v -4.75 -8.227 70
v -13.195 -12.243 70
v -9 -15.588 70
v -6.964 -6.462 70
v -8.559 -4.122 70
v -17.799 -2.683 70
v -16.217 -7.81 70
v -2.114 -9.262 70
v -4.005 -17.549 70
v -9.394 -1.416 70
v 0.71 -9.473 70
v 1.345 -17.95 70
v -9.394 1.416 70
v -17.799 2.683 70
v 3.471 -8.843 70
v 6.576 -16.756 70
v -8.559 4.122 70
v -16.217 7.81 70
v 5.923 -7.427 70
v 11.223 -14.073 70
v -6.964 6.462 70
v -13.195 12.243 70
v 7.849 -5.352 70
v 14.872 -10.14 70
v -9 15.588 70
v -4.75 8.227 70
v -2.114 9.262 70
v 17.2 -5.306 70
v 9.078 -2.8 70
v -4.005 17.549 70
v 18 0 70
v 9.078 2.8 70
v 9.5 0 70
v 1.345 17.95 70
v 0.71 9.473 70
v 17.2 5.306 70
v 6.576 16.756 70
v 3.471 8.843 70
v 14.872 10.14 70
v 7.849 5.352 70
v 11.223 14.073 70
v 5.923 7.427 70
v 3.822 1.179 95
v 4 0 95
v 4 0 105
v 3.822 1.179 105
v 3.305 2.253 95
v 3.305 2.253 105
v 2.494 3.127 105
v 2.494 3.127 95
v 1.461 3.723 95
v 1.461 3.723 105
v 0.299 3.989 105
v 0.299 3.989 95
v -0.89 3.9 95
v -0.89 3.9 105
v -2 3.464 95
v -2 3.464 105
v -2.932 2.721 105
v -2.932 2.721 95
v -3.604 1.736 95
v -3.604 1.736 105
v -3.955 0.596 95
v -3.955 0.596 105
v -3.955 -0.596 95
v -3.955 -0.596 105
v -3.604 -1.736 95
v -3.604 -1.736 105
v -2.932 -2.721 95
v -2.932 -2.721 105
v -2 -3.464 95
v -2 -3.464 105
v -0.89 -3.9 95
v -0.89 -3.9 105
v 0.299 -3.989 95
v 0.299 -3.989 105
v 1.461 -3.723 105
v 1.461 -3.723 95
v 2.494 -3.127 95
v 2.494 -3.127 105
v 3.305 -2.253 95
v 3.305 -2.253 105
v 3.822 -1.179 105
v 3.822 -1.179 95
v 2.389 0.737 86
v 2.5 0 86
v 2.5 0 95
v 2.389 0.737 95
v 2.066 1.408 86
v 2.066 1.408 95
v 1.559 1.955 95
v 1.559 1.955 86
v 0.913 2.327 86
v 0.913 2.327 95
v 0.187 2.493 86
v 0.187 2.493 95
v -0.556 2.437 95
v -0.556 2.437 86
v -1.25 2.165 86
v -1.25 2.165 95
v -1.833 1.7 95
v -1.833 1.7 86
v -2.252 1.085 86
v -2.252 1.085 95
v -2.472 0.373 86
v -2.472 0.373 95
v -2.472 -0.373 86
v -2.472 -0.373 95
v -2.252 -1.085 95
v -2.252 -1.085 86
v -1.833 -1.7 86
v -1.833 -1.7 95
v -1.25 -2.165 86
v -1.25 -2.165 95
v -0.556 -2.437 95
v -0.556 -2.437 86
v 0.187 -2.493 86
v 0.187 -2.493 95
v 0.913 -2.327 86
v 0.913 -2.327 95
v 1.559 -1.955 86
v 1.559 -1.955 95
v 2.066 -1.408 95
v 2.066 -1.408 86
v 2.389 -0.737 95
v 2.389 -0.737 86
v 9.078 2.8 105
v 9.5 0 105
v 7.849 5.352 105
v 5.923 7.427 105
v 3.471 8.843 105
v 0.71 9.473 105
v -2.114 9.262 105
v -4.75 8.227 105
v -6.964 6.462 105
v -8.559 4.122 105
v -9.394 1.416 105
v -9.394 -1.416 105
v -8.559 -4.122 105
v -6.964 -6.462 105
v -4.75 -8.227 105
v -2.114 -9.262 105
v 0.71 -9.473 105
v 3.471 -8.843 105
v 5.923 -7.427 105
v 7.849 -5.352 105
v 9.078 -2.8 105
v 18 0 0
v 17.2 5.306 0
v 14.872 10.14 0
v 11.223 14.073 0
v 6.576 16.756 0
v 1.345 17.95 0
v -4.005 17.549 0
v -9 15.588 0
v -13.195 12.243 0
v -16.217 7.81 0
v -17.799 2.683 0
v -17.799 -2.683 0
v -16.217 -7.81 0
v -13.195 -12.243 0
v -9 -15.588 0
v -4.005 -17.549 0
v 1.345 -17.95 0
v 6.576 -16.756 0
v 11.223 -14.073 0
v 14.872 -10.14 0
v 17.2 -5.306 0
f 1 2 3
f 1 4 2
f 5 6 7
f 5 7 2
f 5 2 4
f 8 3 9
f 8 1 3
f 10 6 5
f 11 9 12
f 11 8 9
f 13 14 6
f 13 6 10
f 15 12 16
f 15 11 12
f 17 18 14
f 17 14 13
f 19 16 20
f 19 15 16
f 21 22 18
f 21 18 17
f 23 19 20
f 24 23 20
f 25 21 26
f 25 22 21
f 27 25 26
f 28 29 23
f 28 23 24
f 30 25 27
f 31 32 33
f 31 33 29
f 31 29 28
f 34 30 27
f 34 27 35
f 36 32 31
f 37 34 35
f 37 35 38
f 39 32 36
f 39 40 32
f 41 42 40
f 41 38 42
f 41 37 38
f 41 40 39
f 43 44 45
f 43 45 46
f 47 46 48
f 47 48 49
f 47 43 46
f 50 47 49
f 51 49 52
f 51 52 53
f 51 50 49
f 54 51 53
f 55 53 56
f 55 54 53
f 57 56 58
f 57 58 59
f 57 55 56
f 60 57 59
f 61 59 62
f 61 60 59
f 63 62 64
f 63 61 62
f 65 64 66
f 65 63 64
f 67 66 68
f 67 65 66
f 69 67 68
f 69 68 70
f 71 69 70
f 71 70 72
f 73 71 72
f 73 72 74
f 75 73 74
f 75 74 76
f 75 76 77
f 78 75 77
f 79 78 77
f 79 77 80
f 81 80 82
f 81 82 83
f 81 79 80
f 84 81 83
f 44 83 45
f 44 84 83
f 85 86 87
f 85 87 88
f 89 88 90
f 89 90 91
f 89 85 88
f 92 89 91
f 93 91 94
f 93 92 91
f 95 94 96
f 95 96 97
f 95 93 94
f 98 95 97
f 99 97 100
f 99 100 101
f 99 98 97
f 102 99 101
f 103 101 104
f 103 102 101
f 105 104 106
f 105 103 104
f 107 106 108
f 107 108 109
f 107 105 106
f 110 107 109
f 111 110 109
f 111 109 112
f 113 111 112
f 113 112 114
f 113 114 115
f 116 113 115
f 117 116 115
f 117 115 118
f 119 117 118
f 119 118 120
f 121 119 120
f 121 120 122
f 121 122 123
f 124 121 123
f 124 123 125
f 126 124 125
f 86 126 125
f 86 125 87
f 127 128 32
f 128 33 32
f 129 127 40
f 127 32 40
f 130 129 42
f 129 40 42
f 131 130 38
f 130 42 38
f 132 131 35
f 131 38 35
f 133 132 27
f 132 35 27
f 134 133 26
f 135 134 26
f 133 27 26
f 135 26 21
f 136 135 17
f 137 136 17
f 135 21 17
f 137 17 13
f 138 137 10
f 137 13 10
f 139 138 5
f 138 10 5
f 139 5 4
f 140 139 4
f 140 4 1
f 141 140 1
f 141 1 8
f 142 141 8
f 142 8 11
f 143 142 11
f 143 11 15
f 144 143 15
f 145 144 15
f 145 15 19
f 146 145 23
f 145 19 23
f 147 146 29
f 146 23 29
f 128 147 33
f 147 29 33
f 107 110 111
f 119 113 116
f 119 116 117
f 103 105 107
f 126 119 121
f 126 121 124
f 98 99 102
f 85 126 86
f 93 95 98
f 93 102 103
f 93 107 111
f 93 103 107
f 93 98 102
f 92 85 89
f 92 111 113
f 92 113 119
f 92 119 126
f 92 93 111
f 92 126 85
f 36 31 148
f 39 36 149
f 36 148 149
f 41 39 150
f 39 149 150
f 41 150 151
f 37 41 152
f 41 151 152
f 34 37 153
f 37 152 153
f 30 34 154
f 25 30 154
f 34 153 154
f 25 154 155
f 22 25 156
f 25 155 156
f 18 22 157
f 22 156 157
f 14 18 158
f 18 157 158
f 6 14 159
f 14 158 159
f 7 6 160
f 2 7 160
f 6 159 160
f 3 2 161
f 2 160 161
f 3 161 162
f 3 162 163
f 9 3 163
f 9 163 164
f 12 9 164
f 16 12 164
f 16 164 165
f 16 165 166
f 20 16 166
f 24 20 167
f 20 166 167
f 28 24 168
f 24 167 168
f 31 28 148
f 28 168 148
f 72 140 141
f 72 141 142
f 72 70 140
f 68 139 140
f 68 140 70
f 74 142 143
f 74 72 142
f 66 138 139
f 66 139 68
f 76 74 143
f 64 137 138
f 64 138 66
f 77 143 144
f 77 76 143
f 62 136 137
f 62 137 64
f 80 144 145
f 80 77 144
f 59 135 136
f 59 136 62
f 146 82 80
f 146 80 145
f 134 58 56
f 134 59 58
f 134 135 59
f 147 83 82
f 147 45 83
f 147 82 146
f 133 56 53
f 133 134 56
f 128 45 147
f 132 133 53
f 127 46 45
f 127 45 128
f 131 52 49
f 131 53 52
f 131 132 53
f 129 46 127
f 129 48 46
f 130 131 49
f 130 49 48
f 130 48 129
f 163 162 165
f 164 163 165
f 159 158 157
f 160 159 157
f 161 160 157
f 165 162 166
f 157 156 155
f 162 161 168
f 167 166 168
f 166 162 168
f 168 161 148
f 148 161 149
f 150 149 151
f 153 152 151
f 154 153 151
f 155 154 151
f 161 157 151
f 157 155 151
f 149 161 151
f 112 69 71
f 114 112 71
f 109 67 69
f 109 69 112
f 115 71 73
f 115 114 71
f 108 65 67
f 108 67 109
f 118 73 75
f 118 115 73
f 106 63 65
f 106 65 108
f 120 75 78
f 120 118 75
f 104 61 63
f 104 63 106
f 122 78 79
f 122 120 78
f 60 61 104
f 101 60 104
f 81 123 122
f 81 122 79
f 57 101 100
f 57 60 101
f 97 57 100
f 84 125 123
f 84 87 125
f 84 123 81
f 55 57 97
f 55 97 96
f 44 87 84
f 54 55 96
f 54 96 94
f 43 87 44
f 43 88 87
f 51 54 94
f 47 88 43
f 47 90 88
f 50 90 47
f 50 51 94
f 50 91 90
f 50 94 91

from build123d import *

# Parameters (mm, degrees)
SKETCH1_R           = 18
BOSS_EXTRUDE1_DEPTH = 70
SKETCH2_R           = 2.5
BOSS_EXTRUDE2_DEPTH = 16
SKETCH3_R           = 9.5
SKETCH3_R_2         = 2.5
BOSS_EXTRUDE3_DEPTH = 25
SKETCH4_R           = 9.5
SKETCH4_R_2         = 4
BOSS_EXTRUDE4_DEPTH = 10


with BuildPart() as part:
    # Sketch1 → Boss-Extrude1 (new body)
    with BuildSketch(Plane.XY):
        Circle(SKETCH1_R)
    extrude(amount=BOSS_EXTRUDE1_DEPTH)

    # Sketch2 → Boss-Extrude2 (add)
    with BuildSketch(Plane.XY.offset(70)):
        Circle(SKETCH2_R)
    extrude(amount=BOSS_EXTRUDE2_DEPTH)

    # Sketch3 → Boss-Extrude3 (add)
    with BuildSketch(Plane.XY.offset(70)):
        Circle(SKETCH3_R)
        Circle(SKETCH3_R_2, mode=Mode.SUBTRACT)
    extrude(amount=BOSS_EXTRUDE3_DEPTH)

    # Sketch4 → Boss-Extrude4 (add)
    with BuildSketch(Plane.XY.offset(95)):
        Circle(SKETCH4_R)
        Circle(SKETCH4_R_2, mode=Mode.SUBTRACT)
    extrude(amount=BOSS_EXTRUDE4_DEPTH)


solid = part.part
